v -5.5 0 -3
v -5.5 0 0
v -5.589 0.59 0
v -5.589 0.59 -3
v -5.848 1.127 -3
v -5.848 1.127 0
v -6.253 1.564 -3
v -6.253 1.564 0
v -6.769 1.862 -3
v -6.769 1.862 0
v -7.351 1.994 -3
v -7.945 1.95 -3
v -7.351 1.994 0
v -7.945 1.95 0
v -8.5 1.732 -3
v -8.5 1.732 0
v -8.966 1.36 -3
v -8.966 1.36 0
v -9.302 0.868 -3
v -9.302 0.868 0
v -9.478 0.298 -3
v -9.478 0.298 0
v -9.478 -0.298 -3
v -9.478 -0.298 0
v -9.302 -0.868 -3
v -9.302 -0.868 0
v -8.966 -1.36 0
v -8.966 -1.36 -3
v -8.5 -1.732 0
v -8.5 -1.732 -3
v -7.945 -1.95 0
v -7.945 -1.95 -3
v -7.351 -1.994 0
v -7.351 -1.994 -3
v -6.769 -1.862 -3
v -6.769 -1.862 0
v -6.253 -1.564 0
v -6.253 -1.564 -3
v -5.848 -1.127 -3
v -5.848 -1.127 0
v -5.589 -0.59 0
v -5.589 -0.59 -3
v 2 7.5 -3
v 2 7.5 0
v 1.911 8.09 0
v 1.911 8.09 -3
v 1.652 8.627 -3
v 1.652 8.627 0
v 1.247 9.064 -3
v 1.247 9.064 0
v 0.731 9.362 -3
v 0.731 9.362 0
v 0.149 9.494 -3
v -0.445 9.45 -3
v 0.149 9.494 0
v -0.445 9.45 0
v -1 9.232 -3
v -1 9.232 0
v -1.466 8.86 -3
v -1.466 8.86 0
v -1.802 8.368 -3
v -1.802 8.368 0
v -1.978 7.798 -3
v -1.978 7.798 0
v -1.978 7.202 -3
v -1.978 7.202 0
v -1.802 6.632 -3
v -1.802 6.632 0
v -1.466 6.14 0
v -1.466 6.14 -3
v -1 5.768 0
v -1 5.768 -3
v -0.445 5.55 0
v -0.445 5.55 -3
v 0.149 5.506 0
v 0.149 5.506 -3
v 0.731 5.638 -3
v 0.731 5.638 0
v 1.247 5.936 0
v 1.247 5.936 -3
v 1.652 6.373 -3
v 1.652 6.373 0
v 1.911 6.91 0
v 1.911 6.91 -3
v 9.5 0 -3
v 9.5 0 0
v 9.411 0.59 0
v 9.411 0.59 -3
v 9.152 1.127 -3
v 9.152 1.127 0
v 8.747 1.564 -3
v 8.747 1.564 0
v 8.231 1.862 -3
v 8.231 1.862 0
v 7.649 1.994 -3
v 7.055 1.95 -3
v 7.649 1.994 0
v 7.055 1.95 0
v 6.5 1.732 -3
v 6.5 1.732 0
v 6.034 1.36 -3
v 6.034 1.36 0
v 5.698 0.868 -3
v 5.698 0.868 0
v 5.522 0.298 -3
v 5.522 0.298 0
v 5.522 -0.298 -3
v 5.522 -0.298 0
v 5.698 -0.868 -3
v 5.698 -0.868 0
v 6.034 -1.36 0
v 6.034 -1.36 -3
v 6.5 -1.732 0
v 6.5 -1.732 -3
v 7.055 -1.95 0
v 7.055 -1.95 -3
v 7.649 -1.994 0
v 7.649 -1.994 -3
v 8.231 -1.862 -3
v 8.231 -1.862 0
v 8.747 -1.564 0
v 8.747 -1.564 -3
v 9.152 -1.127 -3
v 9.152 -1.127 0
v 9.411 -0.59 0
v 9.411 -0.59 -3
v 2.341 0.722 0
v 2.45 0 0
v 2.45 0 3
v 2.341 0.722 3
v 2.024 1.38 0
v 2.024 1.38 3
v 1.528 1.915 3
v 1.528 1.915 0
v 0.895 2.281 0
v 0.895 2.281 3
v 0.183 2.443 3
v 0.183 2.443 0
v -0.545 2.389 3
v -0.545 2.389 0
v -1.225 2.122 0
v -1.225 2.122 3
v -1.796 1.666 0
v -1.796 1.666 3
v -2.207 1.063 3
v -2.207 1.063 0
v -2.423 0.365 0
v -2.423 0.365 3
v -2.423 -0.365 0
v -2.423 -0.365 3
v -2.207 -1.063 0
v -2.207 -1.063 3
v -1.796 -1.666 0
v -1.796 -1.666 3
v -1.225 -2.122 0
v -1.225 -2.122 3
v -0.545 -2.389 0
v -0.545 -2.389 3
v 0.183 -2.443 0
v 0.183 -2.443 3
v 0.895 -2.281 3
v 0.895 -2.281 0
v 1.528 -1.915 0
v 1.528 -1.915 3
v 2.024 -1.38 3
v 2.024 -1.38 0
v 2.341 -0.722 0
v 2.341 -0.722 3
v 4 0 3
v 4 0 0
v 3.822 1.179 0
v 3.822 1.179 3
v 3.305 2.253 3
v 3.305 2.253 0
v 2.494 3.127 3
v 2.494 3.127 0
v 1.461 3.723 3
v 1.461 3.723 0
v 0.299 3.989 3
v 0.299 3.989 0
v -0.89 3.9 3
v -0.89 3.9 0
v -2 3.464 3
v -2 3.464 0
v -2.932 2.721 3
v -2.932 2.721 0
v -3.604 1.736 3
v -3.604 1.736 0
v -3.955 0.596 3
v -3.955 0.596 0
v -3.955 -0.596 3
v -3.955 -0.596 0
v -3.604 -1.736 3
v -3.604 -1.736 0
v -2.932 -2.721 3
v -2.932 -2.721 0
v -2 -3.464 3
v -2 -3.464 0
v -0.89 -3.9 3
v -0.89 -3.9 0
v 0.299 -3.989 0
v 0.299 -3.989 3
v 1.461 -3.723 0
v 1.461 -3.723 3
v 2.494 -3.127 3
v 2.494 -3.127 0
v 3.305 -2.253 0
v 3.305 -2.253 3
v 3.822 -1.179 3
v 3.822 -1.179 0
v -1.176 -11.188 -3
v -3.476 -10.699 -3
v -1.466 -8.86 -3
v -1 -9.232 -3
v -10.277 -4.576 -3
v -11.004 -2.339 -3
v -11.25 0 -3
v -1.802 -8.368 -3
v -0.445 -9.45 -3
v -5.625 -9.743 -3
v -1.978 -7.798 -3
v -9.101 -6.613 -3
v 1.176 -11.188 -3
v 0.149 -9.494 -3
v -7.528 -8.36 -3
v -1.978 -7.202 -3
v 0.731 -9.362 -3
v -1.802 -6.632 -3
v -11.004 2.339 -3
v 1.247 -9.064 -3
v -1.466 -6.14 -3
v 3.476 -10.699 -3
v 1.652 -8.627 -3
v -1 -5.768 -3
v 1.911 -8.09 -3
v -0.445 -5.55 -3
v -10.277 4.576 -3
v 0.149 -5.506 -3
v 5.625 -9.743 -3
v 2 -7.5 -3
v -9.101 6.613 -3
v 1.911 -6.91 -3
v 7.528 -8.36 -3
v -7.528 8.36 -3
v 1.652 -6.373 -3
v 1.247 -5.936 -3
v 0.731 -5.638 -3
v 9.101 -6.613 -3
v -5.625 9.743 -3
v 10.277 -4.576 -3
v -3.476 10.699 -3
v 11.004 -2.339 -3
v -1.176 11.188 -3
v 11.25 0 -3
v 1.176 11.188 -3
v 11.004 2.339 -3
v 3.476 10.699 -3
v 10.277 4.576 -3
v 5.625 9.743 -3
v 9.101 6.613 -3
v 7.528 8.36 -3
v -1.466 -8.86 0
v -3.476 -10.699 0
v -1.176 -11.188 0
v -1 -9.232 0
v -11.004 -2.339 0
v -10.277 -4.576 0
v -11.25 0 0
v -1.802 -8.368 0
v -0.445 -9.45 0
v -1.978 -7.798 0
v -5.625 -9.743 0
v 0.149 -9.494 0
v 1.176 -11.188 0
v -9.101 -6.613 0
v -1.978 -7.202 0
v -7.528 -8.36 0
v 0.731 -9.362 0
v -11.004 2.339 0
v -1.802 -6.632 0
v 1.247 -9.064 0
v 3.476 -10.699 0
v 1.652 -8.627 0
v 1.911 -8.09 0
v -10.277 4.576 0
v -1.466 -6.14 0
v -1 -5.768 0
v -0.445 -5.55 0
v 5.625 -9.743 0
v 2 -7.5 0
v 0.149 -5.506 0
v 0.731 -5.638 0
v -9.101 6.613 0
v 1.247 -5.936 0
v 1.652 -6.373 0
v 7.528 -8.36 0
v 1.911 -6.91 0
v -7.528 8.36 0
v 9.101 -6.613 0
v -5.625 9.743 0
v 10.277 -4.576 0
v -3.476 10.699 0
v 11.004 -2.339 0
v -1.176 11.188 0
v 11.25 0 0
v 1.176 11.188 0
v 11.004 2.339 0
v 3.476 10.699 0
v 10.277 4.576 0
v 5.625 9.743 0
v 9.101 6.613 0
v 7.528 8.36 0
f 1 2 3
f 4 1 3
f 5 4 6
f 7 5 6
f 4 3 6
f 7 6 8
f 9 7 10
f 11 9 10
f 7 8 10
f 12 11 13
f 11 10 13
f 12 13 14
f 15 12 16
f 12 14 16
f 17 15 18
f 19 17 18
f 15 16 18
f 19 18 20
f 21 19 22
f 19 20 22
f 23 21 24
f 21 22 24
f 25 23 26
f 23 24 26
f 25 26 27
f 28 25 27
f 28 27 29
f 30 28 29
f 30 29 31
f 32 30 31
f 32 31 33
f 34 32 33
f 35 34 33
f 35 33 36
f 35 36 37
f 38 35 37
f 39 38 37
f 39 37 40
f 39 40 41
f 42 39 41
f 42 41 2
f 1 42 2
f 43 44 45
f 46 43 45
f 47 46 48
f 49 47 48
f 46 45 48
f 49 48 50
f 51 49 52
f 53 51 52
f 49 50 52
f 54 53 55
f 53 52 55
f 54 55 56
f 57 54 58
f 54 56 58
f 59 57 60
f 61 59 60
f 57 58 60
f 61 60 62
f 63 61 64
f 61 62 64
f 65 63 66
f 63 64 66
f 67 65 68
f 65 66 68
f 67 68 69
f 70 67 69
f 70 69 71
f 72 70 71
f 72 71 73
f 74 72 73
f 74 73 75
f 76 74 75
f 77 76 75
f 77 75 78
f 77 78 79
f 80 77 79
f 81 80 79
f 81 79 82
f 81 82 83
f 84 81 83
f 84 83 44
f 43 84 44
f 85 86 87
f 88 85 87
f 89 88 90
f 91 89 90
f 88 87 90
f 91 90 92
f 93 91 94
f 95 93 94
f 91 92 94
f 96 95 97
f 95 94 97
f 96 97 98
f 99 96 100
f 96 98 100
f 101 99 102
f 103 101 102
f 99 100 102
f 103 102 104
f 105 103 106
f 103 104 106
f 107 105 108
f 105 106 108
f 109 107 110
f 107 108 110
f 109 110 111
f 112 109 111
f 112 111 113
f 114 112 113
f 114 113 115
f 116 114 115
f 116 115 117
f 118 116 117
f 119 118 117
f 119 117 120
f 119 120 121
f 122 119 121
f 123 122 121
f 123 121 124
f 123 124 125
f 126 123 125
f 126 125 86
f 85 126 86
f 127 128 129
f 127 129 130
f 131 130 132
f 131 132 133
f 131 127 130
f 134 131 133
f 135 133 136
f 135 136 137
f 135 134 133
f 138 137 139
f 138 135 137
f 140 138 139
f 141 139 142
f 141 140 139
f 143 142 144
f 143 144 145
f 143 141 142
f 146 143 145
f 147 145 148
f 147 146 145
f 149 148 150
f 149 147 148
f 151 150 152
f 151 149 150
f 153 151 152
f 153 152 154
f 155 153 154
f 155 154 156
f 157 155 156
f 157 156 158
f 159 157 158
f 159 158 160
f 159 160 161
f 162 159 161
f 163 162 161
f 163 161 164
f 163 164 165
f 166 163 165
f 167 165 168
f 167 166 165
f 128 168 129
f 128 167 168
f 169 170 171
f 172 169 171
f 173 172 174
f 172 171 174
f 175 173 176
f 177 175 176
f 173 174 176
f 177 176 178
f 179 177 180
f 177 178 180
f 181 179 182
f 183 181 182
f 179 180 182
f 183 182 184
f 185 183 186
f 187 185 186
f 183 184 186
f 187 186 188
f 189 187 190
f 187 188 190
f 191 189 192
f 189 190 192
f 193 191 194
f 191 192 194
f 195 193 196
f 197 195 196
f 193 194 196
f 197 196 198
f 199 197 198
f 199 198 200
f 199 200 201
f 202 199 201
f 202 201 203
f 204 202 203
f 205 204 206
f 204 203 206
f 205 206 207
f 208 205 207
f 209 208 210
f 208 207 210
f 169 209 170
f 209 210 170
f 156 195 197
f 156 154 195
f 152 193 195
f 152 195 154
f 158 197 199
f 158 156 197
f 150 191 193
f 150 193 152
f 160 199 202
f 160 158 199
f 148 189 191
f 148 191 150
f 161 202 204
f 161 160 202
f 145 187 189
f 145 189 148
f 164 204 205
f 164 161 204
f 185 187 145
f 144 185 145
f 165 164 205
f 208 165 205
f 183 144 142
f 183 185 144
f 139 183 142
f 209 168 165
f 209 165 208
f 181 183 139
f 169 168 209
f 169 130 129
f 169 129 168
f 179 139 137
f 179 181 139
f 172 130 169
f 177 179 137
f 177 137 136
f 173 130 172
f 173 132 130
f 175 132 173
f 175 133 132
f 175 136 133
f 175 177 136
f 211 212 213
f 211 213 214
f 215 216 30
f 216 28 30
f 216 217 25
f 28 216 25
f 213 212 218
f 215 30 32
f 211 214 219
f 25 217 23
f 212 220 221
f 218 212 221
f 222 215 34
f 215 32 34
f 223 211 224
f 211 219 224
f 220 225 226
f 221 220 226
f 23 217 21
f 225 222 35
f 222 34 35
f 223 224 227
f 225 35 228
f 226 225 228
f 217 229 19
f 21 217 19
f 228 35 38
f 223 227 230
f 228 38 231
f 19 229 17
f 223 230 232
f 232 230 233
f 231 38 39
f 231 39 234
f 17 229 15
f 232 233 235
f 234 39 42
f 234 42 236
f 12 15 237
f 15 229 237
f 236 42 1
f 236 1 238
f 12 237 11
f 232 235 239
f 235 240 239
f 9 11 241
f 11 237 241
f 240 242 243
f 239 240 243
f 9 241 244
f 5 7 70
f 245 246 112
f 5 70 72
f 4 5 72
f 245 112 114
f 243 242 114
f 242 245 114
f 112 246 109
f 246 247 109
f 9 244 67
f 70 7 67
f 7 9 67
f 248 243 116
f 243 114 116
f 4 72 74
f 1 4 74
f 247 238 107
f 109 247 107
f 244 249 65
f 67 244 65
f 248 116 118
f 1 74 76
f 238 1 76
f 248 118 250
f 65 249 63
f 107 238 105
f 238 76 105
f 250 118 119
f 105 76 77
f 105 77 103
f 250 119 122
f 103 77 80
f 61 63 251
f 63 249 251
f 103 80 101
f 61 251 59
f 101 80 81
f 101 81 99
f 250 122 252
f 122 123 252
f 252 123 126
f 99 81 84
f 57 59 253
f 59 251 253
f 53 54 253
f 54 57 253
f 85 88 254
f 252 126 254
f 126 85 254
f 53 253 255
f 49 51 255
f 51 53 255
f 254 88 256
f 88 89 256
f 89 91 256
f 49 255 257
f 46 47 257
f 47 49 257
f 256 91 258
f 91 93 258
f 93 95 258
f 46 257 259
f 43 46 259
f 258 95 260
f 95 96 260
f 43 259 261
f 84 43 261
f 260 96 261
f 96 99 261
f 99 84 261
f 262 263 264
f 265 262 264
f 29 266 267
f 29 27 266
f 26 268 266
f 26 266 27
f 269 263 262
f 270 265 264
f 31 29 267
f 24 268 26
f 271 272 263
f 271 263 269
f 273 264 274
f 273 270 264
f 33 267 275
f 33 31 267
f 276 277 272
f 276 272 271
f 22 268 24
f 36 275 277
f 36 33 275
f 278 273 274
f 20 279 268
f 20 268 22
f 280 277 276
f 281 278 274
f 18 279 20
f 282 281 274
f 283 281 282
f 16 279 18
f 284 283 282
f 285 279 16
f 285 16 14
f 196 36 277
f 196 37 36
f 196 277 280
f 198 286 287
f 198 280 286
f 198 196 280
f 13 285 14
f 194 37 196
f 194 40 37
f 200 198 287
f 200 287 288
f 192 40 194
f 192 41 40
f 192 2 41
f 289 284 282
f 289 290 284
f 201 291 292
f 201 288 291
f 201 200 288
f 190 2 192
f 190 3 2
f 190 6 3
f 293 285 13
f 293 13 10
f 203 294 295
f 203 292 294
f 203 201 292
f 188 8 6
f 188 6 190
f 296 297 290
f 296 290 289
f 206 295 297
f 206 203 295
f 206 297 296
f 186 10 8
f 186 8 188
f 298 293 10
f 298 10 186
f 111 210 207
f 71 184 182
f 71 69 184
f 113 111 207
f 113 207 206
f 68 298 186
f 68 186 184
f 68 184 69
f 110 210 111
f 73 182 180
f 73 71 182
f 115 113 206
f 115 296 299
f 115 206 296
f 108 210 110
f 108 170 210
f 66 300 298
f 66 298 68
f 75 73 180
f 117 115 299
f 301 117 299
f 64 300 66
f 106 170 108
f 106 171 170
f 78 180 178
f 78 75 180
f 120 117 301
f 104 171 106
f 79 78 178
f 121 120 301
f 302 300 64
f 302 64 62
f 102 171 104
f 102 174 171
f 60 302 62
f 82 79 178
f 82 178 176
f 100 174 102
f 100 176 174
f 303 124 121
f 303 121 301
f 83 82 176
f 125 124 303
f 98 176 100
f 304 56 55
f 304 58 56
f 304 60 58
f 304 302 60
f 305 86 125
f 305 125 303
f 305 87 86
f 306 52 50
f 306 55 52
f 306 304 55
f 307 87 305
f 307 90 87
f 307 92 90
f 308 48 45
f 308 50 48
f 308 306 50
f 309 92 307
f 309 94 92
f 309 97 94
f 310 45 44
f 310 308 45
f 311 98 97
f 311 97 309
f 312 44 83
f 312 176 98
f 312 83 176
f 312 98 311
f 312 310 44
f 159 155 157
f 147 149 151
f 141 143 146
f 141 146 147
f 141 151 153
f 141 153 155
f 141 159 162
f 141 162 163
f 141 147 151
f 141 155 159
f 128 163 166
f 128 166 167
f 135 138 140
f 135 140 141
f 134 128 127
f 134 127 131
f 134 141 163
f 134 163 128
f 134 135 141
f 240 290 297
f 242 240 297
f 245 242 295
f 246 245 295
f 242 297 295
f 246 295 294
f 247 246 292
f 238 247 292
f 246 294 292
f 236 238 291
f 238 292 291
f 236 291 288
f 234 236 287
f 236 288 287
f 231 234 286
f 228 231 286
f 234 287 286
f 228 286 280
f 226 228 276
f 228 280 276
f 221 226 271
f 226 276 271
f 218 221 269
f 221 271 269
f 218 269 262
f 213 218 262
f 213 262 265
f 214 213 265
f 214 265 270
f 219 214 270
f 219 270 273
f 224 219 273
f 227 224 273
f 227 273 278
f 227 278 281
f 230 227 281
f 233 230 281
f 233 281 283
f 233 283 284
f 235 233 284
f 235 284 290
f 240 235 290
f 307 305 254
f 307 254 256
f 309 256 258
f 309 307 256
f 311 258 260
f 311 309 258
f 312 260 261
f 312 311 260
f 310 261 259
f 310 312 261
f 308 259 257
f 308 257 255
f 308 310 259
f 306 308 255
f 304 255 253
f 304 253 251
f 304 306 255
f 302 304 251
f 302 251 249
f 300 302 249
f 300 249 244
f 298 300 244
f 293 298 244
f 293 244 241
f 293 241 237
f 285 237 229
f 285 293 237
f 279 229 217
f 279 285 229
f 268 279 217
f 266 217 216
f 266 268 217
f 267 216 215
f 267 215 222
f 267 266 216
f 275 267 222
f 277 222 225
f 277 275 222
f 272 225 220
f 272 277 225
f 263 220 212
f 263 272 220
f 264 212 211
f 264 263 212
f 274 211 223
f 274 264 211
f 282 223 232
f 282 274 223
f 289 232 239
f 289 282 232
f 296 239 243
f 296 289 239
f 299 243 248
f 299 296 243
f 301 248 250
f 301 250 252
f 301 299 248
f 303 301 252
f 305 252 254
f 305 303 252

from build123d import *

# Parameters (mm, degrees)
SKIZZE1_R                       = 11.25
AUFSATZ_LINEAR_AUSTRAGEN1_DEPTH = 3
SKIZZE2_R                       = 4
SKIZZE2_R_2                     = 2.45
AUFSATZ_LINEAR_AUSTRAGEN2_DEPTH = 3
SCHNITT_LINEAR_AUSTRAGEN1_REACH = 18.19
SKIZZE3_R                       = 2


with BuildPart() as part:
    # Skizze1 → Aufsatz-Linear austragen1 (new body)
    with BuildSketch(Plane.XY):
        Circle(SKIZZE1_R)
    extrude(amount=-AUFSATZ_LINEAR_AUSTRAGEN1_DEPTH)

    # Skizze2 → Aufsatz-Linear austragen2 (add)
    with BuildSketch(Plane.XY):
        Circle(SKIZZE2_R)
        Circle(SKIZZE2_R_2, mode=Mode.SUBTRACT)
    extrude(amount=AUFSATZ_LINEAR_AUSTRAGEN2_DEPTH)

    # Skizze3 → Schnitt-Linear austragen1 (cut, up to next)
    with BuildSketch(Plane.XY, mode=Mode.PRIVATE) as schnitt_linear_austragen1_sk1:
        with Locations((0, 7.5)):
            Circle(SKIZZE3_R)
    schnitt_linear_austragen1_tool1 = extrude(schnitt_linear_austragen1_sk1.sketch, amount=-SCHNITT_LINEAR_AUSTRAGEN1_REACH, mode=Mode.PRIVATE) & part.part
    # Skizze3 → Schnitt-Linear austragen1 (cut, up to next)
    with BuildSketch(Plane.XY, mode=Mode.PRIVATE) as schnitt_linear_austragen1_sk2:
        with Locations((7.5, 0)):
            Circle(SKIZZE3_R)
    schnitt_linear_austragen1_tool2 = extrude(schnitt_linear_austragen1_sk2.sketch, amount=-SCHNITT_LINEAR_AUSTRAGEN1_REACH, mode=Mode.PRIVATE) & part.part
    # Skizze3 → Schnitt-Linear austragen1 (cut, up to next)
    with BuildSketch(Plane.XY, mode=Mode.PRIVATE) as schnitt_linear_austragen1_sk3:
        with Locations((0, -7.5)):
            Circle(SKIZZE3_R)
    schnitt_linear_austragen1_tool3 = extrude(schnitt_linear_austragen1_sk3.sketch, amount=-SCHNITT_LINEAR_AUSTRAGEN1_REACH, mode=Mode.PRIVATE) & part.part
    # Skizze3 → Schnitt-Linear austragen1 (cut, up to next)
    with BuildSketch(Plane.XY, mode=Mode.PRIVATE) as schnitt_linear_austragen1_sk4:
        with Locations((-7.5, 0)):
            Circle(SKIZZE3_R)
    schnitt_linear_austragen1_tool4 = extrude(schnitt_linear_austragen1_sk4.sketch, amount=-SCHNITT_LINEAR_AUSTRAGEN1_REACH, mode=Mode.PRIVATE) & part.part
    add(schnitt_linear_austragen1_tool1.solids().sort_by_distance((0, 7.5, 0))[0], mode=Mode.SUBTRACT)
    add(schnitt_linear_austragen1_tool2.solids().sort_by_distance((7.5, 0, 0))[0], mode=Mode.SUBTRACT)
    add(schnitt_linear_austragen1_tool3.solids().sort_by_distance((0, -7.5, 0))[0], mode=Mode.SUBTRACT)
    add(schnitt_linear_austragen1_tool4.solids().sort_by_distance((-7.5, 0, 0))[0], mode=Mode.SUBTRACT)


solid = part.part
